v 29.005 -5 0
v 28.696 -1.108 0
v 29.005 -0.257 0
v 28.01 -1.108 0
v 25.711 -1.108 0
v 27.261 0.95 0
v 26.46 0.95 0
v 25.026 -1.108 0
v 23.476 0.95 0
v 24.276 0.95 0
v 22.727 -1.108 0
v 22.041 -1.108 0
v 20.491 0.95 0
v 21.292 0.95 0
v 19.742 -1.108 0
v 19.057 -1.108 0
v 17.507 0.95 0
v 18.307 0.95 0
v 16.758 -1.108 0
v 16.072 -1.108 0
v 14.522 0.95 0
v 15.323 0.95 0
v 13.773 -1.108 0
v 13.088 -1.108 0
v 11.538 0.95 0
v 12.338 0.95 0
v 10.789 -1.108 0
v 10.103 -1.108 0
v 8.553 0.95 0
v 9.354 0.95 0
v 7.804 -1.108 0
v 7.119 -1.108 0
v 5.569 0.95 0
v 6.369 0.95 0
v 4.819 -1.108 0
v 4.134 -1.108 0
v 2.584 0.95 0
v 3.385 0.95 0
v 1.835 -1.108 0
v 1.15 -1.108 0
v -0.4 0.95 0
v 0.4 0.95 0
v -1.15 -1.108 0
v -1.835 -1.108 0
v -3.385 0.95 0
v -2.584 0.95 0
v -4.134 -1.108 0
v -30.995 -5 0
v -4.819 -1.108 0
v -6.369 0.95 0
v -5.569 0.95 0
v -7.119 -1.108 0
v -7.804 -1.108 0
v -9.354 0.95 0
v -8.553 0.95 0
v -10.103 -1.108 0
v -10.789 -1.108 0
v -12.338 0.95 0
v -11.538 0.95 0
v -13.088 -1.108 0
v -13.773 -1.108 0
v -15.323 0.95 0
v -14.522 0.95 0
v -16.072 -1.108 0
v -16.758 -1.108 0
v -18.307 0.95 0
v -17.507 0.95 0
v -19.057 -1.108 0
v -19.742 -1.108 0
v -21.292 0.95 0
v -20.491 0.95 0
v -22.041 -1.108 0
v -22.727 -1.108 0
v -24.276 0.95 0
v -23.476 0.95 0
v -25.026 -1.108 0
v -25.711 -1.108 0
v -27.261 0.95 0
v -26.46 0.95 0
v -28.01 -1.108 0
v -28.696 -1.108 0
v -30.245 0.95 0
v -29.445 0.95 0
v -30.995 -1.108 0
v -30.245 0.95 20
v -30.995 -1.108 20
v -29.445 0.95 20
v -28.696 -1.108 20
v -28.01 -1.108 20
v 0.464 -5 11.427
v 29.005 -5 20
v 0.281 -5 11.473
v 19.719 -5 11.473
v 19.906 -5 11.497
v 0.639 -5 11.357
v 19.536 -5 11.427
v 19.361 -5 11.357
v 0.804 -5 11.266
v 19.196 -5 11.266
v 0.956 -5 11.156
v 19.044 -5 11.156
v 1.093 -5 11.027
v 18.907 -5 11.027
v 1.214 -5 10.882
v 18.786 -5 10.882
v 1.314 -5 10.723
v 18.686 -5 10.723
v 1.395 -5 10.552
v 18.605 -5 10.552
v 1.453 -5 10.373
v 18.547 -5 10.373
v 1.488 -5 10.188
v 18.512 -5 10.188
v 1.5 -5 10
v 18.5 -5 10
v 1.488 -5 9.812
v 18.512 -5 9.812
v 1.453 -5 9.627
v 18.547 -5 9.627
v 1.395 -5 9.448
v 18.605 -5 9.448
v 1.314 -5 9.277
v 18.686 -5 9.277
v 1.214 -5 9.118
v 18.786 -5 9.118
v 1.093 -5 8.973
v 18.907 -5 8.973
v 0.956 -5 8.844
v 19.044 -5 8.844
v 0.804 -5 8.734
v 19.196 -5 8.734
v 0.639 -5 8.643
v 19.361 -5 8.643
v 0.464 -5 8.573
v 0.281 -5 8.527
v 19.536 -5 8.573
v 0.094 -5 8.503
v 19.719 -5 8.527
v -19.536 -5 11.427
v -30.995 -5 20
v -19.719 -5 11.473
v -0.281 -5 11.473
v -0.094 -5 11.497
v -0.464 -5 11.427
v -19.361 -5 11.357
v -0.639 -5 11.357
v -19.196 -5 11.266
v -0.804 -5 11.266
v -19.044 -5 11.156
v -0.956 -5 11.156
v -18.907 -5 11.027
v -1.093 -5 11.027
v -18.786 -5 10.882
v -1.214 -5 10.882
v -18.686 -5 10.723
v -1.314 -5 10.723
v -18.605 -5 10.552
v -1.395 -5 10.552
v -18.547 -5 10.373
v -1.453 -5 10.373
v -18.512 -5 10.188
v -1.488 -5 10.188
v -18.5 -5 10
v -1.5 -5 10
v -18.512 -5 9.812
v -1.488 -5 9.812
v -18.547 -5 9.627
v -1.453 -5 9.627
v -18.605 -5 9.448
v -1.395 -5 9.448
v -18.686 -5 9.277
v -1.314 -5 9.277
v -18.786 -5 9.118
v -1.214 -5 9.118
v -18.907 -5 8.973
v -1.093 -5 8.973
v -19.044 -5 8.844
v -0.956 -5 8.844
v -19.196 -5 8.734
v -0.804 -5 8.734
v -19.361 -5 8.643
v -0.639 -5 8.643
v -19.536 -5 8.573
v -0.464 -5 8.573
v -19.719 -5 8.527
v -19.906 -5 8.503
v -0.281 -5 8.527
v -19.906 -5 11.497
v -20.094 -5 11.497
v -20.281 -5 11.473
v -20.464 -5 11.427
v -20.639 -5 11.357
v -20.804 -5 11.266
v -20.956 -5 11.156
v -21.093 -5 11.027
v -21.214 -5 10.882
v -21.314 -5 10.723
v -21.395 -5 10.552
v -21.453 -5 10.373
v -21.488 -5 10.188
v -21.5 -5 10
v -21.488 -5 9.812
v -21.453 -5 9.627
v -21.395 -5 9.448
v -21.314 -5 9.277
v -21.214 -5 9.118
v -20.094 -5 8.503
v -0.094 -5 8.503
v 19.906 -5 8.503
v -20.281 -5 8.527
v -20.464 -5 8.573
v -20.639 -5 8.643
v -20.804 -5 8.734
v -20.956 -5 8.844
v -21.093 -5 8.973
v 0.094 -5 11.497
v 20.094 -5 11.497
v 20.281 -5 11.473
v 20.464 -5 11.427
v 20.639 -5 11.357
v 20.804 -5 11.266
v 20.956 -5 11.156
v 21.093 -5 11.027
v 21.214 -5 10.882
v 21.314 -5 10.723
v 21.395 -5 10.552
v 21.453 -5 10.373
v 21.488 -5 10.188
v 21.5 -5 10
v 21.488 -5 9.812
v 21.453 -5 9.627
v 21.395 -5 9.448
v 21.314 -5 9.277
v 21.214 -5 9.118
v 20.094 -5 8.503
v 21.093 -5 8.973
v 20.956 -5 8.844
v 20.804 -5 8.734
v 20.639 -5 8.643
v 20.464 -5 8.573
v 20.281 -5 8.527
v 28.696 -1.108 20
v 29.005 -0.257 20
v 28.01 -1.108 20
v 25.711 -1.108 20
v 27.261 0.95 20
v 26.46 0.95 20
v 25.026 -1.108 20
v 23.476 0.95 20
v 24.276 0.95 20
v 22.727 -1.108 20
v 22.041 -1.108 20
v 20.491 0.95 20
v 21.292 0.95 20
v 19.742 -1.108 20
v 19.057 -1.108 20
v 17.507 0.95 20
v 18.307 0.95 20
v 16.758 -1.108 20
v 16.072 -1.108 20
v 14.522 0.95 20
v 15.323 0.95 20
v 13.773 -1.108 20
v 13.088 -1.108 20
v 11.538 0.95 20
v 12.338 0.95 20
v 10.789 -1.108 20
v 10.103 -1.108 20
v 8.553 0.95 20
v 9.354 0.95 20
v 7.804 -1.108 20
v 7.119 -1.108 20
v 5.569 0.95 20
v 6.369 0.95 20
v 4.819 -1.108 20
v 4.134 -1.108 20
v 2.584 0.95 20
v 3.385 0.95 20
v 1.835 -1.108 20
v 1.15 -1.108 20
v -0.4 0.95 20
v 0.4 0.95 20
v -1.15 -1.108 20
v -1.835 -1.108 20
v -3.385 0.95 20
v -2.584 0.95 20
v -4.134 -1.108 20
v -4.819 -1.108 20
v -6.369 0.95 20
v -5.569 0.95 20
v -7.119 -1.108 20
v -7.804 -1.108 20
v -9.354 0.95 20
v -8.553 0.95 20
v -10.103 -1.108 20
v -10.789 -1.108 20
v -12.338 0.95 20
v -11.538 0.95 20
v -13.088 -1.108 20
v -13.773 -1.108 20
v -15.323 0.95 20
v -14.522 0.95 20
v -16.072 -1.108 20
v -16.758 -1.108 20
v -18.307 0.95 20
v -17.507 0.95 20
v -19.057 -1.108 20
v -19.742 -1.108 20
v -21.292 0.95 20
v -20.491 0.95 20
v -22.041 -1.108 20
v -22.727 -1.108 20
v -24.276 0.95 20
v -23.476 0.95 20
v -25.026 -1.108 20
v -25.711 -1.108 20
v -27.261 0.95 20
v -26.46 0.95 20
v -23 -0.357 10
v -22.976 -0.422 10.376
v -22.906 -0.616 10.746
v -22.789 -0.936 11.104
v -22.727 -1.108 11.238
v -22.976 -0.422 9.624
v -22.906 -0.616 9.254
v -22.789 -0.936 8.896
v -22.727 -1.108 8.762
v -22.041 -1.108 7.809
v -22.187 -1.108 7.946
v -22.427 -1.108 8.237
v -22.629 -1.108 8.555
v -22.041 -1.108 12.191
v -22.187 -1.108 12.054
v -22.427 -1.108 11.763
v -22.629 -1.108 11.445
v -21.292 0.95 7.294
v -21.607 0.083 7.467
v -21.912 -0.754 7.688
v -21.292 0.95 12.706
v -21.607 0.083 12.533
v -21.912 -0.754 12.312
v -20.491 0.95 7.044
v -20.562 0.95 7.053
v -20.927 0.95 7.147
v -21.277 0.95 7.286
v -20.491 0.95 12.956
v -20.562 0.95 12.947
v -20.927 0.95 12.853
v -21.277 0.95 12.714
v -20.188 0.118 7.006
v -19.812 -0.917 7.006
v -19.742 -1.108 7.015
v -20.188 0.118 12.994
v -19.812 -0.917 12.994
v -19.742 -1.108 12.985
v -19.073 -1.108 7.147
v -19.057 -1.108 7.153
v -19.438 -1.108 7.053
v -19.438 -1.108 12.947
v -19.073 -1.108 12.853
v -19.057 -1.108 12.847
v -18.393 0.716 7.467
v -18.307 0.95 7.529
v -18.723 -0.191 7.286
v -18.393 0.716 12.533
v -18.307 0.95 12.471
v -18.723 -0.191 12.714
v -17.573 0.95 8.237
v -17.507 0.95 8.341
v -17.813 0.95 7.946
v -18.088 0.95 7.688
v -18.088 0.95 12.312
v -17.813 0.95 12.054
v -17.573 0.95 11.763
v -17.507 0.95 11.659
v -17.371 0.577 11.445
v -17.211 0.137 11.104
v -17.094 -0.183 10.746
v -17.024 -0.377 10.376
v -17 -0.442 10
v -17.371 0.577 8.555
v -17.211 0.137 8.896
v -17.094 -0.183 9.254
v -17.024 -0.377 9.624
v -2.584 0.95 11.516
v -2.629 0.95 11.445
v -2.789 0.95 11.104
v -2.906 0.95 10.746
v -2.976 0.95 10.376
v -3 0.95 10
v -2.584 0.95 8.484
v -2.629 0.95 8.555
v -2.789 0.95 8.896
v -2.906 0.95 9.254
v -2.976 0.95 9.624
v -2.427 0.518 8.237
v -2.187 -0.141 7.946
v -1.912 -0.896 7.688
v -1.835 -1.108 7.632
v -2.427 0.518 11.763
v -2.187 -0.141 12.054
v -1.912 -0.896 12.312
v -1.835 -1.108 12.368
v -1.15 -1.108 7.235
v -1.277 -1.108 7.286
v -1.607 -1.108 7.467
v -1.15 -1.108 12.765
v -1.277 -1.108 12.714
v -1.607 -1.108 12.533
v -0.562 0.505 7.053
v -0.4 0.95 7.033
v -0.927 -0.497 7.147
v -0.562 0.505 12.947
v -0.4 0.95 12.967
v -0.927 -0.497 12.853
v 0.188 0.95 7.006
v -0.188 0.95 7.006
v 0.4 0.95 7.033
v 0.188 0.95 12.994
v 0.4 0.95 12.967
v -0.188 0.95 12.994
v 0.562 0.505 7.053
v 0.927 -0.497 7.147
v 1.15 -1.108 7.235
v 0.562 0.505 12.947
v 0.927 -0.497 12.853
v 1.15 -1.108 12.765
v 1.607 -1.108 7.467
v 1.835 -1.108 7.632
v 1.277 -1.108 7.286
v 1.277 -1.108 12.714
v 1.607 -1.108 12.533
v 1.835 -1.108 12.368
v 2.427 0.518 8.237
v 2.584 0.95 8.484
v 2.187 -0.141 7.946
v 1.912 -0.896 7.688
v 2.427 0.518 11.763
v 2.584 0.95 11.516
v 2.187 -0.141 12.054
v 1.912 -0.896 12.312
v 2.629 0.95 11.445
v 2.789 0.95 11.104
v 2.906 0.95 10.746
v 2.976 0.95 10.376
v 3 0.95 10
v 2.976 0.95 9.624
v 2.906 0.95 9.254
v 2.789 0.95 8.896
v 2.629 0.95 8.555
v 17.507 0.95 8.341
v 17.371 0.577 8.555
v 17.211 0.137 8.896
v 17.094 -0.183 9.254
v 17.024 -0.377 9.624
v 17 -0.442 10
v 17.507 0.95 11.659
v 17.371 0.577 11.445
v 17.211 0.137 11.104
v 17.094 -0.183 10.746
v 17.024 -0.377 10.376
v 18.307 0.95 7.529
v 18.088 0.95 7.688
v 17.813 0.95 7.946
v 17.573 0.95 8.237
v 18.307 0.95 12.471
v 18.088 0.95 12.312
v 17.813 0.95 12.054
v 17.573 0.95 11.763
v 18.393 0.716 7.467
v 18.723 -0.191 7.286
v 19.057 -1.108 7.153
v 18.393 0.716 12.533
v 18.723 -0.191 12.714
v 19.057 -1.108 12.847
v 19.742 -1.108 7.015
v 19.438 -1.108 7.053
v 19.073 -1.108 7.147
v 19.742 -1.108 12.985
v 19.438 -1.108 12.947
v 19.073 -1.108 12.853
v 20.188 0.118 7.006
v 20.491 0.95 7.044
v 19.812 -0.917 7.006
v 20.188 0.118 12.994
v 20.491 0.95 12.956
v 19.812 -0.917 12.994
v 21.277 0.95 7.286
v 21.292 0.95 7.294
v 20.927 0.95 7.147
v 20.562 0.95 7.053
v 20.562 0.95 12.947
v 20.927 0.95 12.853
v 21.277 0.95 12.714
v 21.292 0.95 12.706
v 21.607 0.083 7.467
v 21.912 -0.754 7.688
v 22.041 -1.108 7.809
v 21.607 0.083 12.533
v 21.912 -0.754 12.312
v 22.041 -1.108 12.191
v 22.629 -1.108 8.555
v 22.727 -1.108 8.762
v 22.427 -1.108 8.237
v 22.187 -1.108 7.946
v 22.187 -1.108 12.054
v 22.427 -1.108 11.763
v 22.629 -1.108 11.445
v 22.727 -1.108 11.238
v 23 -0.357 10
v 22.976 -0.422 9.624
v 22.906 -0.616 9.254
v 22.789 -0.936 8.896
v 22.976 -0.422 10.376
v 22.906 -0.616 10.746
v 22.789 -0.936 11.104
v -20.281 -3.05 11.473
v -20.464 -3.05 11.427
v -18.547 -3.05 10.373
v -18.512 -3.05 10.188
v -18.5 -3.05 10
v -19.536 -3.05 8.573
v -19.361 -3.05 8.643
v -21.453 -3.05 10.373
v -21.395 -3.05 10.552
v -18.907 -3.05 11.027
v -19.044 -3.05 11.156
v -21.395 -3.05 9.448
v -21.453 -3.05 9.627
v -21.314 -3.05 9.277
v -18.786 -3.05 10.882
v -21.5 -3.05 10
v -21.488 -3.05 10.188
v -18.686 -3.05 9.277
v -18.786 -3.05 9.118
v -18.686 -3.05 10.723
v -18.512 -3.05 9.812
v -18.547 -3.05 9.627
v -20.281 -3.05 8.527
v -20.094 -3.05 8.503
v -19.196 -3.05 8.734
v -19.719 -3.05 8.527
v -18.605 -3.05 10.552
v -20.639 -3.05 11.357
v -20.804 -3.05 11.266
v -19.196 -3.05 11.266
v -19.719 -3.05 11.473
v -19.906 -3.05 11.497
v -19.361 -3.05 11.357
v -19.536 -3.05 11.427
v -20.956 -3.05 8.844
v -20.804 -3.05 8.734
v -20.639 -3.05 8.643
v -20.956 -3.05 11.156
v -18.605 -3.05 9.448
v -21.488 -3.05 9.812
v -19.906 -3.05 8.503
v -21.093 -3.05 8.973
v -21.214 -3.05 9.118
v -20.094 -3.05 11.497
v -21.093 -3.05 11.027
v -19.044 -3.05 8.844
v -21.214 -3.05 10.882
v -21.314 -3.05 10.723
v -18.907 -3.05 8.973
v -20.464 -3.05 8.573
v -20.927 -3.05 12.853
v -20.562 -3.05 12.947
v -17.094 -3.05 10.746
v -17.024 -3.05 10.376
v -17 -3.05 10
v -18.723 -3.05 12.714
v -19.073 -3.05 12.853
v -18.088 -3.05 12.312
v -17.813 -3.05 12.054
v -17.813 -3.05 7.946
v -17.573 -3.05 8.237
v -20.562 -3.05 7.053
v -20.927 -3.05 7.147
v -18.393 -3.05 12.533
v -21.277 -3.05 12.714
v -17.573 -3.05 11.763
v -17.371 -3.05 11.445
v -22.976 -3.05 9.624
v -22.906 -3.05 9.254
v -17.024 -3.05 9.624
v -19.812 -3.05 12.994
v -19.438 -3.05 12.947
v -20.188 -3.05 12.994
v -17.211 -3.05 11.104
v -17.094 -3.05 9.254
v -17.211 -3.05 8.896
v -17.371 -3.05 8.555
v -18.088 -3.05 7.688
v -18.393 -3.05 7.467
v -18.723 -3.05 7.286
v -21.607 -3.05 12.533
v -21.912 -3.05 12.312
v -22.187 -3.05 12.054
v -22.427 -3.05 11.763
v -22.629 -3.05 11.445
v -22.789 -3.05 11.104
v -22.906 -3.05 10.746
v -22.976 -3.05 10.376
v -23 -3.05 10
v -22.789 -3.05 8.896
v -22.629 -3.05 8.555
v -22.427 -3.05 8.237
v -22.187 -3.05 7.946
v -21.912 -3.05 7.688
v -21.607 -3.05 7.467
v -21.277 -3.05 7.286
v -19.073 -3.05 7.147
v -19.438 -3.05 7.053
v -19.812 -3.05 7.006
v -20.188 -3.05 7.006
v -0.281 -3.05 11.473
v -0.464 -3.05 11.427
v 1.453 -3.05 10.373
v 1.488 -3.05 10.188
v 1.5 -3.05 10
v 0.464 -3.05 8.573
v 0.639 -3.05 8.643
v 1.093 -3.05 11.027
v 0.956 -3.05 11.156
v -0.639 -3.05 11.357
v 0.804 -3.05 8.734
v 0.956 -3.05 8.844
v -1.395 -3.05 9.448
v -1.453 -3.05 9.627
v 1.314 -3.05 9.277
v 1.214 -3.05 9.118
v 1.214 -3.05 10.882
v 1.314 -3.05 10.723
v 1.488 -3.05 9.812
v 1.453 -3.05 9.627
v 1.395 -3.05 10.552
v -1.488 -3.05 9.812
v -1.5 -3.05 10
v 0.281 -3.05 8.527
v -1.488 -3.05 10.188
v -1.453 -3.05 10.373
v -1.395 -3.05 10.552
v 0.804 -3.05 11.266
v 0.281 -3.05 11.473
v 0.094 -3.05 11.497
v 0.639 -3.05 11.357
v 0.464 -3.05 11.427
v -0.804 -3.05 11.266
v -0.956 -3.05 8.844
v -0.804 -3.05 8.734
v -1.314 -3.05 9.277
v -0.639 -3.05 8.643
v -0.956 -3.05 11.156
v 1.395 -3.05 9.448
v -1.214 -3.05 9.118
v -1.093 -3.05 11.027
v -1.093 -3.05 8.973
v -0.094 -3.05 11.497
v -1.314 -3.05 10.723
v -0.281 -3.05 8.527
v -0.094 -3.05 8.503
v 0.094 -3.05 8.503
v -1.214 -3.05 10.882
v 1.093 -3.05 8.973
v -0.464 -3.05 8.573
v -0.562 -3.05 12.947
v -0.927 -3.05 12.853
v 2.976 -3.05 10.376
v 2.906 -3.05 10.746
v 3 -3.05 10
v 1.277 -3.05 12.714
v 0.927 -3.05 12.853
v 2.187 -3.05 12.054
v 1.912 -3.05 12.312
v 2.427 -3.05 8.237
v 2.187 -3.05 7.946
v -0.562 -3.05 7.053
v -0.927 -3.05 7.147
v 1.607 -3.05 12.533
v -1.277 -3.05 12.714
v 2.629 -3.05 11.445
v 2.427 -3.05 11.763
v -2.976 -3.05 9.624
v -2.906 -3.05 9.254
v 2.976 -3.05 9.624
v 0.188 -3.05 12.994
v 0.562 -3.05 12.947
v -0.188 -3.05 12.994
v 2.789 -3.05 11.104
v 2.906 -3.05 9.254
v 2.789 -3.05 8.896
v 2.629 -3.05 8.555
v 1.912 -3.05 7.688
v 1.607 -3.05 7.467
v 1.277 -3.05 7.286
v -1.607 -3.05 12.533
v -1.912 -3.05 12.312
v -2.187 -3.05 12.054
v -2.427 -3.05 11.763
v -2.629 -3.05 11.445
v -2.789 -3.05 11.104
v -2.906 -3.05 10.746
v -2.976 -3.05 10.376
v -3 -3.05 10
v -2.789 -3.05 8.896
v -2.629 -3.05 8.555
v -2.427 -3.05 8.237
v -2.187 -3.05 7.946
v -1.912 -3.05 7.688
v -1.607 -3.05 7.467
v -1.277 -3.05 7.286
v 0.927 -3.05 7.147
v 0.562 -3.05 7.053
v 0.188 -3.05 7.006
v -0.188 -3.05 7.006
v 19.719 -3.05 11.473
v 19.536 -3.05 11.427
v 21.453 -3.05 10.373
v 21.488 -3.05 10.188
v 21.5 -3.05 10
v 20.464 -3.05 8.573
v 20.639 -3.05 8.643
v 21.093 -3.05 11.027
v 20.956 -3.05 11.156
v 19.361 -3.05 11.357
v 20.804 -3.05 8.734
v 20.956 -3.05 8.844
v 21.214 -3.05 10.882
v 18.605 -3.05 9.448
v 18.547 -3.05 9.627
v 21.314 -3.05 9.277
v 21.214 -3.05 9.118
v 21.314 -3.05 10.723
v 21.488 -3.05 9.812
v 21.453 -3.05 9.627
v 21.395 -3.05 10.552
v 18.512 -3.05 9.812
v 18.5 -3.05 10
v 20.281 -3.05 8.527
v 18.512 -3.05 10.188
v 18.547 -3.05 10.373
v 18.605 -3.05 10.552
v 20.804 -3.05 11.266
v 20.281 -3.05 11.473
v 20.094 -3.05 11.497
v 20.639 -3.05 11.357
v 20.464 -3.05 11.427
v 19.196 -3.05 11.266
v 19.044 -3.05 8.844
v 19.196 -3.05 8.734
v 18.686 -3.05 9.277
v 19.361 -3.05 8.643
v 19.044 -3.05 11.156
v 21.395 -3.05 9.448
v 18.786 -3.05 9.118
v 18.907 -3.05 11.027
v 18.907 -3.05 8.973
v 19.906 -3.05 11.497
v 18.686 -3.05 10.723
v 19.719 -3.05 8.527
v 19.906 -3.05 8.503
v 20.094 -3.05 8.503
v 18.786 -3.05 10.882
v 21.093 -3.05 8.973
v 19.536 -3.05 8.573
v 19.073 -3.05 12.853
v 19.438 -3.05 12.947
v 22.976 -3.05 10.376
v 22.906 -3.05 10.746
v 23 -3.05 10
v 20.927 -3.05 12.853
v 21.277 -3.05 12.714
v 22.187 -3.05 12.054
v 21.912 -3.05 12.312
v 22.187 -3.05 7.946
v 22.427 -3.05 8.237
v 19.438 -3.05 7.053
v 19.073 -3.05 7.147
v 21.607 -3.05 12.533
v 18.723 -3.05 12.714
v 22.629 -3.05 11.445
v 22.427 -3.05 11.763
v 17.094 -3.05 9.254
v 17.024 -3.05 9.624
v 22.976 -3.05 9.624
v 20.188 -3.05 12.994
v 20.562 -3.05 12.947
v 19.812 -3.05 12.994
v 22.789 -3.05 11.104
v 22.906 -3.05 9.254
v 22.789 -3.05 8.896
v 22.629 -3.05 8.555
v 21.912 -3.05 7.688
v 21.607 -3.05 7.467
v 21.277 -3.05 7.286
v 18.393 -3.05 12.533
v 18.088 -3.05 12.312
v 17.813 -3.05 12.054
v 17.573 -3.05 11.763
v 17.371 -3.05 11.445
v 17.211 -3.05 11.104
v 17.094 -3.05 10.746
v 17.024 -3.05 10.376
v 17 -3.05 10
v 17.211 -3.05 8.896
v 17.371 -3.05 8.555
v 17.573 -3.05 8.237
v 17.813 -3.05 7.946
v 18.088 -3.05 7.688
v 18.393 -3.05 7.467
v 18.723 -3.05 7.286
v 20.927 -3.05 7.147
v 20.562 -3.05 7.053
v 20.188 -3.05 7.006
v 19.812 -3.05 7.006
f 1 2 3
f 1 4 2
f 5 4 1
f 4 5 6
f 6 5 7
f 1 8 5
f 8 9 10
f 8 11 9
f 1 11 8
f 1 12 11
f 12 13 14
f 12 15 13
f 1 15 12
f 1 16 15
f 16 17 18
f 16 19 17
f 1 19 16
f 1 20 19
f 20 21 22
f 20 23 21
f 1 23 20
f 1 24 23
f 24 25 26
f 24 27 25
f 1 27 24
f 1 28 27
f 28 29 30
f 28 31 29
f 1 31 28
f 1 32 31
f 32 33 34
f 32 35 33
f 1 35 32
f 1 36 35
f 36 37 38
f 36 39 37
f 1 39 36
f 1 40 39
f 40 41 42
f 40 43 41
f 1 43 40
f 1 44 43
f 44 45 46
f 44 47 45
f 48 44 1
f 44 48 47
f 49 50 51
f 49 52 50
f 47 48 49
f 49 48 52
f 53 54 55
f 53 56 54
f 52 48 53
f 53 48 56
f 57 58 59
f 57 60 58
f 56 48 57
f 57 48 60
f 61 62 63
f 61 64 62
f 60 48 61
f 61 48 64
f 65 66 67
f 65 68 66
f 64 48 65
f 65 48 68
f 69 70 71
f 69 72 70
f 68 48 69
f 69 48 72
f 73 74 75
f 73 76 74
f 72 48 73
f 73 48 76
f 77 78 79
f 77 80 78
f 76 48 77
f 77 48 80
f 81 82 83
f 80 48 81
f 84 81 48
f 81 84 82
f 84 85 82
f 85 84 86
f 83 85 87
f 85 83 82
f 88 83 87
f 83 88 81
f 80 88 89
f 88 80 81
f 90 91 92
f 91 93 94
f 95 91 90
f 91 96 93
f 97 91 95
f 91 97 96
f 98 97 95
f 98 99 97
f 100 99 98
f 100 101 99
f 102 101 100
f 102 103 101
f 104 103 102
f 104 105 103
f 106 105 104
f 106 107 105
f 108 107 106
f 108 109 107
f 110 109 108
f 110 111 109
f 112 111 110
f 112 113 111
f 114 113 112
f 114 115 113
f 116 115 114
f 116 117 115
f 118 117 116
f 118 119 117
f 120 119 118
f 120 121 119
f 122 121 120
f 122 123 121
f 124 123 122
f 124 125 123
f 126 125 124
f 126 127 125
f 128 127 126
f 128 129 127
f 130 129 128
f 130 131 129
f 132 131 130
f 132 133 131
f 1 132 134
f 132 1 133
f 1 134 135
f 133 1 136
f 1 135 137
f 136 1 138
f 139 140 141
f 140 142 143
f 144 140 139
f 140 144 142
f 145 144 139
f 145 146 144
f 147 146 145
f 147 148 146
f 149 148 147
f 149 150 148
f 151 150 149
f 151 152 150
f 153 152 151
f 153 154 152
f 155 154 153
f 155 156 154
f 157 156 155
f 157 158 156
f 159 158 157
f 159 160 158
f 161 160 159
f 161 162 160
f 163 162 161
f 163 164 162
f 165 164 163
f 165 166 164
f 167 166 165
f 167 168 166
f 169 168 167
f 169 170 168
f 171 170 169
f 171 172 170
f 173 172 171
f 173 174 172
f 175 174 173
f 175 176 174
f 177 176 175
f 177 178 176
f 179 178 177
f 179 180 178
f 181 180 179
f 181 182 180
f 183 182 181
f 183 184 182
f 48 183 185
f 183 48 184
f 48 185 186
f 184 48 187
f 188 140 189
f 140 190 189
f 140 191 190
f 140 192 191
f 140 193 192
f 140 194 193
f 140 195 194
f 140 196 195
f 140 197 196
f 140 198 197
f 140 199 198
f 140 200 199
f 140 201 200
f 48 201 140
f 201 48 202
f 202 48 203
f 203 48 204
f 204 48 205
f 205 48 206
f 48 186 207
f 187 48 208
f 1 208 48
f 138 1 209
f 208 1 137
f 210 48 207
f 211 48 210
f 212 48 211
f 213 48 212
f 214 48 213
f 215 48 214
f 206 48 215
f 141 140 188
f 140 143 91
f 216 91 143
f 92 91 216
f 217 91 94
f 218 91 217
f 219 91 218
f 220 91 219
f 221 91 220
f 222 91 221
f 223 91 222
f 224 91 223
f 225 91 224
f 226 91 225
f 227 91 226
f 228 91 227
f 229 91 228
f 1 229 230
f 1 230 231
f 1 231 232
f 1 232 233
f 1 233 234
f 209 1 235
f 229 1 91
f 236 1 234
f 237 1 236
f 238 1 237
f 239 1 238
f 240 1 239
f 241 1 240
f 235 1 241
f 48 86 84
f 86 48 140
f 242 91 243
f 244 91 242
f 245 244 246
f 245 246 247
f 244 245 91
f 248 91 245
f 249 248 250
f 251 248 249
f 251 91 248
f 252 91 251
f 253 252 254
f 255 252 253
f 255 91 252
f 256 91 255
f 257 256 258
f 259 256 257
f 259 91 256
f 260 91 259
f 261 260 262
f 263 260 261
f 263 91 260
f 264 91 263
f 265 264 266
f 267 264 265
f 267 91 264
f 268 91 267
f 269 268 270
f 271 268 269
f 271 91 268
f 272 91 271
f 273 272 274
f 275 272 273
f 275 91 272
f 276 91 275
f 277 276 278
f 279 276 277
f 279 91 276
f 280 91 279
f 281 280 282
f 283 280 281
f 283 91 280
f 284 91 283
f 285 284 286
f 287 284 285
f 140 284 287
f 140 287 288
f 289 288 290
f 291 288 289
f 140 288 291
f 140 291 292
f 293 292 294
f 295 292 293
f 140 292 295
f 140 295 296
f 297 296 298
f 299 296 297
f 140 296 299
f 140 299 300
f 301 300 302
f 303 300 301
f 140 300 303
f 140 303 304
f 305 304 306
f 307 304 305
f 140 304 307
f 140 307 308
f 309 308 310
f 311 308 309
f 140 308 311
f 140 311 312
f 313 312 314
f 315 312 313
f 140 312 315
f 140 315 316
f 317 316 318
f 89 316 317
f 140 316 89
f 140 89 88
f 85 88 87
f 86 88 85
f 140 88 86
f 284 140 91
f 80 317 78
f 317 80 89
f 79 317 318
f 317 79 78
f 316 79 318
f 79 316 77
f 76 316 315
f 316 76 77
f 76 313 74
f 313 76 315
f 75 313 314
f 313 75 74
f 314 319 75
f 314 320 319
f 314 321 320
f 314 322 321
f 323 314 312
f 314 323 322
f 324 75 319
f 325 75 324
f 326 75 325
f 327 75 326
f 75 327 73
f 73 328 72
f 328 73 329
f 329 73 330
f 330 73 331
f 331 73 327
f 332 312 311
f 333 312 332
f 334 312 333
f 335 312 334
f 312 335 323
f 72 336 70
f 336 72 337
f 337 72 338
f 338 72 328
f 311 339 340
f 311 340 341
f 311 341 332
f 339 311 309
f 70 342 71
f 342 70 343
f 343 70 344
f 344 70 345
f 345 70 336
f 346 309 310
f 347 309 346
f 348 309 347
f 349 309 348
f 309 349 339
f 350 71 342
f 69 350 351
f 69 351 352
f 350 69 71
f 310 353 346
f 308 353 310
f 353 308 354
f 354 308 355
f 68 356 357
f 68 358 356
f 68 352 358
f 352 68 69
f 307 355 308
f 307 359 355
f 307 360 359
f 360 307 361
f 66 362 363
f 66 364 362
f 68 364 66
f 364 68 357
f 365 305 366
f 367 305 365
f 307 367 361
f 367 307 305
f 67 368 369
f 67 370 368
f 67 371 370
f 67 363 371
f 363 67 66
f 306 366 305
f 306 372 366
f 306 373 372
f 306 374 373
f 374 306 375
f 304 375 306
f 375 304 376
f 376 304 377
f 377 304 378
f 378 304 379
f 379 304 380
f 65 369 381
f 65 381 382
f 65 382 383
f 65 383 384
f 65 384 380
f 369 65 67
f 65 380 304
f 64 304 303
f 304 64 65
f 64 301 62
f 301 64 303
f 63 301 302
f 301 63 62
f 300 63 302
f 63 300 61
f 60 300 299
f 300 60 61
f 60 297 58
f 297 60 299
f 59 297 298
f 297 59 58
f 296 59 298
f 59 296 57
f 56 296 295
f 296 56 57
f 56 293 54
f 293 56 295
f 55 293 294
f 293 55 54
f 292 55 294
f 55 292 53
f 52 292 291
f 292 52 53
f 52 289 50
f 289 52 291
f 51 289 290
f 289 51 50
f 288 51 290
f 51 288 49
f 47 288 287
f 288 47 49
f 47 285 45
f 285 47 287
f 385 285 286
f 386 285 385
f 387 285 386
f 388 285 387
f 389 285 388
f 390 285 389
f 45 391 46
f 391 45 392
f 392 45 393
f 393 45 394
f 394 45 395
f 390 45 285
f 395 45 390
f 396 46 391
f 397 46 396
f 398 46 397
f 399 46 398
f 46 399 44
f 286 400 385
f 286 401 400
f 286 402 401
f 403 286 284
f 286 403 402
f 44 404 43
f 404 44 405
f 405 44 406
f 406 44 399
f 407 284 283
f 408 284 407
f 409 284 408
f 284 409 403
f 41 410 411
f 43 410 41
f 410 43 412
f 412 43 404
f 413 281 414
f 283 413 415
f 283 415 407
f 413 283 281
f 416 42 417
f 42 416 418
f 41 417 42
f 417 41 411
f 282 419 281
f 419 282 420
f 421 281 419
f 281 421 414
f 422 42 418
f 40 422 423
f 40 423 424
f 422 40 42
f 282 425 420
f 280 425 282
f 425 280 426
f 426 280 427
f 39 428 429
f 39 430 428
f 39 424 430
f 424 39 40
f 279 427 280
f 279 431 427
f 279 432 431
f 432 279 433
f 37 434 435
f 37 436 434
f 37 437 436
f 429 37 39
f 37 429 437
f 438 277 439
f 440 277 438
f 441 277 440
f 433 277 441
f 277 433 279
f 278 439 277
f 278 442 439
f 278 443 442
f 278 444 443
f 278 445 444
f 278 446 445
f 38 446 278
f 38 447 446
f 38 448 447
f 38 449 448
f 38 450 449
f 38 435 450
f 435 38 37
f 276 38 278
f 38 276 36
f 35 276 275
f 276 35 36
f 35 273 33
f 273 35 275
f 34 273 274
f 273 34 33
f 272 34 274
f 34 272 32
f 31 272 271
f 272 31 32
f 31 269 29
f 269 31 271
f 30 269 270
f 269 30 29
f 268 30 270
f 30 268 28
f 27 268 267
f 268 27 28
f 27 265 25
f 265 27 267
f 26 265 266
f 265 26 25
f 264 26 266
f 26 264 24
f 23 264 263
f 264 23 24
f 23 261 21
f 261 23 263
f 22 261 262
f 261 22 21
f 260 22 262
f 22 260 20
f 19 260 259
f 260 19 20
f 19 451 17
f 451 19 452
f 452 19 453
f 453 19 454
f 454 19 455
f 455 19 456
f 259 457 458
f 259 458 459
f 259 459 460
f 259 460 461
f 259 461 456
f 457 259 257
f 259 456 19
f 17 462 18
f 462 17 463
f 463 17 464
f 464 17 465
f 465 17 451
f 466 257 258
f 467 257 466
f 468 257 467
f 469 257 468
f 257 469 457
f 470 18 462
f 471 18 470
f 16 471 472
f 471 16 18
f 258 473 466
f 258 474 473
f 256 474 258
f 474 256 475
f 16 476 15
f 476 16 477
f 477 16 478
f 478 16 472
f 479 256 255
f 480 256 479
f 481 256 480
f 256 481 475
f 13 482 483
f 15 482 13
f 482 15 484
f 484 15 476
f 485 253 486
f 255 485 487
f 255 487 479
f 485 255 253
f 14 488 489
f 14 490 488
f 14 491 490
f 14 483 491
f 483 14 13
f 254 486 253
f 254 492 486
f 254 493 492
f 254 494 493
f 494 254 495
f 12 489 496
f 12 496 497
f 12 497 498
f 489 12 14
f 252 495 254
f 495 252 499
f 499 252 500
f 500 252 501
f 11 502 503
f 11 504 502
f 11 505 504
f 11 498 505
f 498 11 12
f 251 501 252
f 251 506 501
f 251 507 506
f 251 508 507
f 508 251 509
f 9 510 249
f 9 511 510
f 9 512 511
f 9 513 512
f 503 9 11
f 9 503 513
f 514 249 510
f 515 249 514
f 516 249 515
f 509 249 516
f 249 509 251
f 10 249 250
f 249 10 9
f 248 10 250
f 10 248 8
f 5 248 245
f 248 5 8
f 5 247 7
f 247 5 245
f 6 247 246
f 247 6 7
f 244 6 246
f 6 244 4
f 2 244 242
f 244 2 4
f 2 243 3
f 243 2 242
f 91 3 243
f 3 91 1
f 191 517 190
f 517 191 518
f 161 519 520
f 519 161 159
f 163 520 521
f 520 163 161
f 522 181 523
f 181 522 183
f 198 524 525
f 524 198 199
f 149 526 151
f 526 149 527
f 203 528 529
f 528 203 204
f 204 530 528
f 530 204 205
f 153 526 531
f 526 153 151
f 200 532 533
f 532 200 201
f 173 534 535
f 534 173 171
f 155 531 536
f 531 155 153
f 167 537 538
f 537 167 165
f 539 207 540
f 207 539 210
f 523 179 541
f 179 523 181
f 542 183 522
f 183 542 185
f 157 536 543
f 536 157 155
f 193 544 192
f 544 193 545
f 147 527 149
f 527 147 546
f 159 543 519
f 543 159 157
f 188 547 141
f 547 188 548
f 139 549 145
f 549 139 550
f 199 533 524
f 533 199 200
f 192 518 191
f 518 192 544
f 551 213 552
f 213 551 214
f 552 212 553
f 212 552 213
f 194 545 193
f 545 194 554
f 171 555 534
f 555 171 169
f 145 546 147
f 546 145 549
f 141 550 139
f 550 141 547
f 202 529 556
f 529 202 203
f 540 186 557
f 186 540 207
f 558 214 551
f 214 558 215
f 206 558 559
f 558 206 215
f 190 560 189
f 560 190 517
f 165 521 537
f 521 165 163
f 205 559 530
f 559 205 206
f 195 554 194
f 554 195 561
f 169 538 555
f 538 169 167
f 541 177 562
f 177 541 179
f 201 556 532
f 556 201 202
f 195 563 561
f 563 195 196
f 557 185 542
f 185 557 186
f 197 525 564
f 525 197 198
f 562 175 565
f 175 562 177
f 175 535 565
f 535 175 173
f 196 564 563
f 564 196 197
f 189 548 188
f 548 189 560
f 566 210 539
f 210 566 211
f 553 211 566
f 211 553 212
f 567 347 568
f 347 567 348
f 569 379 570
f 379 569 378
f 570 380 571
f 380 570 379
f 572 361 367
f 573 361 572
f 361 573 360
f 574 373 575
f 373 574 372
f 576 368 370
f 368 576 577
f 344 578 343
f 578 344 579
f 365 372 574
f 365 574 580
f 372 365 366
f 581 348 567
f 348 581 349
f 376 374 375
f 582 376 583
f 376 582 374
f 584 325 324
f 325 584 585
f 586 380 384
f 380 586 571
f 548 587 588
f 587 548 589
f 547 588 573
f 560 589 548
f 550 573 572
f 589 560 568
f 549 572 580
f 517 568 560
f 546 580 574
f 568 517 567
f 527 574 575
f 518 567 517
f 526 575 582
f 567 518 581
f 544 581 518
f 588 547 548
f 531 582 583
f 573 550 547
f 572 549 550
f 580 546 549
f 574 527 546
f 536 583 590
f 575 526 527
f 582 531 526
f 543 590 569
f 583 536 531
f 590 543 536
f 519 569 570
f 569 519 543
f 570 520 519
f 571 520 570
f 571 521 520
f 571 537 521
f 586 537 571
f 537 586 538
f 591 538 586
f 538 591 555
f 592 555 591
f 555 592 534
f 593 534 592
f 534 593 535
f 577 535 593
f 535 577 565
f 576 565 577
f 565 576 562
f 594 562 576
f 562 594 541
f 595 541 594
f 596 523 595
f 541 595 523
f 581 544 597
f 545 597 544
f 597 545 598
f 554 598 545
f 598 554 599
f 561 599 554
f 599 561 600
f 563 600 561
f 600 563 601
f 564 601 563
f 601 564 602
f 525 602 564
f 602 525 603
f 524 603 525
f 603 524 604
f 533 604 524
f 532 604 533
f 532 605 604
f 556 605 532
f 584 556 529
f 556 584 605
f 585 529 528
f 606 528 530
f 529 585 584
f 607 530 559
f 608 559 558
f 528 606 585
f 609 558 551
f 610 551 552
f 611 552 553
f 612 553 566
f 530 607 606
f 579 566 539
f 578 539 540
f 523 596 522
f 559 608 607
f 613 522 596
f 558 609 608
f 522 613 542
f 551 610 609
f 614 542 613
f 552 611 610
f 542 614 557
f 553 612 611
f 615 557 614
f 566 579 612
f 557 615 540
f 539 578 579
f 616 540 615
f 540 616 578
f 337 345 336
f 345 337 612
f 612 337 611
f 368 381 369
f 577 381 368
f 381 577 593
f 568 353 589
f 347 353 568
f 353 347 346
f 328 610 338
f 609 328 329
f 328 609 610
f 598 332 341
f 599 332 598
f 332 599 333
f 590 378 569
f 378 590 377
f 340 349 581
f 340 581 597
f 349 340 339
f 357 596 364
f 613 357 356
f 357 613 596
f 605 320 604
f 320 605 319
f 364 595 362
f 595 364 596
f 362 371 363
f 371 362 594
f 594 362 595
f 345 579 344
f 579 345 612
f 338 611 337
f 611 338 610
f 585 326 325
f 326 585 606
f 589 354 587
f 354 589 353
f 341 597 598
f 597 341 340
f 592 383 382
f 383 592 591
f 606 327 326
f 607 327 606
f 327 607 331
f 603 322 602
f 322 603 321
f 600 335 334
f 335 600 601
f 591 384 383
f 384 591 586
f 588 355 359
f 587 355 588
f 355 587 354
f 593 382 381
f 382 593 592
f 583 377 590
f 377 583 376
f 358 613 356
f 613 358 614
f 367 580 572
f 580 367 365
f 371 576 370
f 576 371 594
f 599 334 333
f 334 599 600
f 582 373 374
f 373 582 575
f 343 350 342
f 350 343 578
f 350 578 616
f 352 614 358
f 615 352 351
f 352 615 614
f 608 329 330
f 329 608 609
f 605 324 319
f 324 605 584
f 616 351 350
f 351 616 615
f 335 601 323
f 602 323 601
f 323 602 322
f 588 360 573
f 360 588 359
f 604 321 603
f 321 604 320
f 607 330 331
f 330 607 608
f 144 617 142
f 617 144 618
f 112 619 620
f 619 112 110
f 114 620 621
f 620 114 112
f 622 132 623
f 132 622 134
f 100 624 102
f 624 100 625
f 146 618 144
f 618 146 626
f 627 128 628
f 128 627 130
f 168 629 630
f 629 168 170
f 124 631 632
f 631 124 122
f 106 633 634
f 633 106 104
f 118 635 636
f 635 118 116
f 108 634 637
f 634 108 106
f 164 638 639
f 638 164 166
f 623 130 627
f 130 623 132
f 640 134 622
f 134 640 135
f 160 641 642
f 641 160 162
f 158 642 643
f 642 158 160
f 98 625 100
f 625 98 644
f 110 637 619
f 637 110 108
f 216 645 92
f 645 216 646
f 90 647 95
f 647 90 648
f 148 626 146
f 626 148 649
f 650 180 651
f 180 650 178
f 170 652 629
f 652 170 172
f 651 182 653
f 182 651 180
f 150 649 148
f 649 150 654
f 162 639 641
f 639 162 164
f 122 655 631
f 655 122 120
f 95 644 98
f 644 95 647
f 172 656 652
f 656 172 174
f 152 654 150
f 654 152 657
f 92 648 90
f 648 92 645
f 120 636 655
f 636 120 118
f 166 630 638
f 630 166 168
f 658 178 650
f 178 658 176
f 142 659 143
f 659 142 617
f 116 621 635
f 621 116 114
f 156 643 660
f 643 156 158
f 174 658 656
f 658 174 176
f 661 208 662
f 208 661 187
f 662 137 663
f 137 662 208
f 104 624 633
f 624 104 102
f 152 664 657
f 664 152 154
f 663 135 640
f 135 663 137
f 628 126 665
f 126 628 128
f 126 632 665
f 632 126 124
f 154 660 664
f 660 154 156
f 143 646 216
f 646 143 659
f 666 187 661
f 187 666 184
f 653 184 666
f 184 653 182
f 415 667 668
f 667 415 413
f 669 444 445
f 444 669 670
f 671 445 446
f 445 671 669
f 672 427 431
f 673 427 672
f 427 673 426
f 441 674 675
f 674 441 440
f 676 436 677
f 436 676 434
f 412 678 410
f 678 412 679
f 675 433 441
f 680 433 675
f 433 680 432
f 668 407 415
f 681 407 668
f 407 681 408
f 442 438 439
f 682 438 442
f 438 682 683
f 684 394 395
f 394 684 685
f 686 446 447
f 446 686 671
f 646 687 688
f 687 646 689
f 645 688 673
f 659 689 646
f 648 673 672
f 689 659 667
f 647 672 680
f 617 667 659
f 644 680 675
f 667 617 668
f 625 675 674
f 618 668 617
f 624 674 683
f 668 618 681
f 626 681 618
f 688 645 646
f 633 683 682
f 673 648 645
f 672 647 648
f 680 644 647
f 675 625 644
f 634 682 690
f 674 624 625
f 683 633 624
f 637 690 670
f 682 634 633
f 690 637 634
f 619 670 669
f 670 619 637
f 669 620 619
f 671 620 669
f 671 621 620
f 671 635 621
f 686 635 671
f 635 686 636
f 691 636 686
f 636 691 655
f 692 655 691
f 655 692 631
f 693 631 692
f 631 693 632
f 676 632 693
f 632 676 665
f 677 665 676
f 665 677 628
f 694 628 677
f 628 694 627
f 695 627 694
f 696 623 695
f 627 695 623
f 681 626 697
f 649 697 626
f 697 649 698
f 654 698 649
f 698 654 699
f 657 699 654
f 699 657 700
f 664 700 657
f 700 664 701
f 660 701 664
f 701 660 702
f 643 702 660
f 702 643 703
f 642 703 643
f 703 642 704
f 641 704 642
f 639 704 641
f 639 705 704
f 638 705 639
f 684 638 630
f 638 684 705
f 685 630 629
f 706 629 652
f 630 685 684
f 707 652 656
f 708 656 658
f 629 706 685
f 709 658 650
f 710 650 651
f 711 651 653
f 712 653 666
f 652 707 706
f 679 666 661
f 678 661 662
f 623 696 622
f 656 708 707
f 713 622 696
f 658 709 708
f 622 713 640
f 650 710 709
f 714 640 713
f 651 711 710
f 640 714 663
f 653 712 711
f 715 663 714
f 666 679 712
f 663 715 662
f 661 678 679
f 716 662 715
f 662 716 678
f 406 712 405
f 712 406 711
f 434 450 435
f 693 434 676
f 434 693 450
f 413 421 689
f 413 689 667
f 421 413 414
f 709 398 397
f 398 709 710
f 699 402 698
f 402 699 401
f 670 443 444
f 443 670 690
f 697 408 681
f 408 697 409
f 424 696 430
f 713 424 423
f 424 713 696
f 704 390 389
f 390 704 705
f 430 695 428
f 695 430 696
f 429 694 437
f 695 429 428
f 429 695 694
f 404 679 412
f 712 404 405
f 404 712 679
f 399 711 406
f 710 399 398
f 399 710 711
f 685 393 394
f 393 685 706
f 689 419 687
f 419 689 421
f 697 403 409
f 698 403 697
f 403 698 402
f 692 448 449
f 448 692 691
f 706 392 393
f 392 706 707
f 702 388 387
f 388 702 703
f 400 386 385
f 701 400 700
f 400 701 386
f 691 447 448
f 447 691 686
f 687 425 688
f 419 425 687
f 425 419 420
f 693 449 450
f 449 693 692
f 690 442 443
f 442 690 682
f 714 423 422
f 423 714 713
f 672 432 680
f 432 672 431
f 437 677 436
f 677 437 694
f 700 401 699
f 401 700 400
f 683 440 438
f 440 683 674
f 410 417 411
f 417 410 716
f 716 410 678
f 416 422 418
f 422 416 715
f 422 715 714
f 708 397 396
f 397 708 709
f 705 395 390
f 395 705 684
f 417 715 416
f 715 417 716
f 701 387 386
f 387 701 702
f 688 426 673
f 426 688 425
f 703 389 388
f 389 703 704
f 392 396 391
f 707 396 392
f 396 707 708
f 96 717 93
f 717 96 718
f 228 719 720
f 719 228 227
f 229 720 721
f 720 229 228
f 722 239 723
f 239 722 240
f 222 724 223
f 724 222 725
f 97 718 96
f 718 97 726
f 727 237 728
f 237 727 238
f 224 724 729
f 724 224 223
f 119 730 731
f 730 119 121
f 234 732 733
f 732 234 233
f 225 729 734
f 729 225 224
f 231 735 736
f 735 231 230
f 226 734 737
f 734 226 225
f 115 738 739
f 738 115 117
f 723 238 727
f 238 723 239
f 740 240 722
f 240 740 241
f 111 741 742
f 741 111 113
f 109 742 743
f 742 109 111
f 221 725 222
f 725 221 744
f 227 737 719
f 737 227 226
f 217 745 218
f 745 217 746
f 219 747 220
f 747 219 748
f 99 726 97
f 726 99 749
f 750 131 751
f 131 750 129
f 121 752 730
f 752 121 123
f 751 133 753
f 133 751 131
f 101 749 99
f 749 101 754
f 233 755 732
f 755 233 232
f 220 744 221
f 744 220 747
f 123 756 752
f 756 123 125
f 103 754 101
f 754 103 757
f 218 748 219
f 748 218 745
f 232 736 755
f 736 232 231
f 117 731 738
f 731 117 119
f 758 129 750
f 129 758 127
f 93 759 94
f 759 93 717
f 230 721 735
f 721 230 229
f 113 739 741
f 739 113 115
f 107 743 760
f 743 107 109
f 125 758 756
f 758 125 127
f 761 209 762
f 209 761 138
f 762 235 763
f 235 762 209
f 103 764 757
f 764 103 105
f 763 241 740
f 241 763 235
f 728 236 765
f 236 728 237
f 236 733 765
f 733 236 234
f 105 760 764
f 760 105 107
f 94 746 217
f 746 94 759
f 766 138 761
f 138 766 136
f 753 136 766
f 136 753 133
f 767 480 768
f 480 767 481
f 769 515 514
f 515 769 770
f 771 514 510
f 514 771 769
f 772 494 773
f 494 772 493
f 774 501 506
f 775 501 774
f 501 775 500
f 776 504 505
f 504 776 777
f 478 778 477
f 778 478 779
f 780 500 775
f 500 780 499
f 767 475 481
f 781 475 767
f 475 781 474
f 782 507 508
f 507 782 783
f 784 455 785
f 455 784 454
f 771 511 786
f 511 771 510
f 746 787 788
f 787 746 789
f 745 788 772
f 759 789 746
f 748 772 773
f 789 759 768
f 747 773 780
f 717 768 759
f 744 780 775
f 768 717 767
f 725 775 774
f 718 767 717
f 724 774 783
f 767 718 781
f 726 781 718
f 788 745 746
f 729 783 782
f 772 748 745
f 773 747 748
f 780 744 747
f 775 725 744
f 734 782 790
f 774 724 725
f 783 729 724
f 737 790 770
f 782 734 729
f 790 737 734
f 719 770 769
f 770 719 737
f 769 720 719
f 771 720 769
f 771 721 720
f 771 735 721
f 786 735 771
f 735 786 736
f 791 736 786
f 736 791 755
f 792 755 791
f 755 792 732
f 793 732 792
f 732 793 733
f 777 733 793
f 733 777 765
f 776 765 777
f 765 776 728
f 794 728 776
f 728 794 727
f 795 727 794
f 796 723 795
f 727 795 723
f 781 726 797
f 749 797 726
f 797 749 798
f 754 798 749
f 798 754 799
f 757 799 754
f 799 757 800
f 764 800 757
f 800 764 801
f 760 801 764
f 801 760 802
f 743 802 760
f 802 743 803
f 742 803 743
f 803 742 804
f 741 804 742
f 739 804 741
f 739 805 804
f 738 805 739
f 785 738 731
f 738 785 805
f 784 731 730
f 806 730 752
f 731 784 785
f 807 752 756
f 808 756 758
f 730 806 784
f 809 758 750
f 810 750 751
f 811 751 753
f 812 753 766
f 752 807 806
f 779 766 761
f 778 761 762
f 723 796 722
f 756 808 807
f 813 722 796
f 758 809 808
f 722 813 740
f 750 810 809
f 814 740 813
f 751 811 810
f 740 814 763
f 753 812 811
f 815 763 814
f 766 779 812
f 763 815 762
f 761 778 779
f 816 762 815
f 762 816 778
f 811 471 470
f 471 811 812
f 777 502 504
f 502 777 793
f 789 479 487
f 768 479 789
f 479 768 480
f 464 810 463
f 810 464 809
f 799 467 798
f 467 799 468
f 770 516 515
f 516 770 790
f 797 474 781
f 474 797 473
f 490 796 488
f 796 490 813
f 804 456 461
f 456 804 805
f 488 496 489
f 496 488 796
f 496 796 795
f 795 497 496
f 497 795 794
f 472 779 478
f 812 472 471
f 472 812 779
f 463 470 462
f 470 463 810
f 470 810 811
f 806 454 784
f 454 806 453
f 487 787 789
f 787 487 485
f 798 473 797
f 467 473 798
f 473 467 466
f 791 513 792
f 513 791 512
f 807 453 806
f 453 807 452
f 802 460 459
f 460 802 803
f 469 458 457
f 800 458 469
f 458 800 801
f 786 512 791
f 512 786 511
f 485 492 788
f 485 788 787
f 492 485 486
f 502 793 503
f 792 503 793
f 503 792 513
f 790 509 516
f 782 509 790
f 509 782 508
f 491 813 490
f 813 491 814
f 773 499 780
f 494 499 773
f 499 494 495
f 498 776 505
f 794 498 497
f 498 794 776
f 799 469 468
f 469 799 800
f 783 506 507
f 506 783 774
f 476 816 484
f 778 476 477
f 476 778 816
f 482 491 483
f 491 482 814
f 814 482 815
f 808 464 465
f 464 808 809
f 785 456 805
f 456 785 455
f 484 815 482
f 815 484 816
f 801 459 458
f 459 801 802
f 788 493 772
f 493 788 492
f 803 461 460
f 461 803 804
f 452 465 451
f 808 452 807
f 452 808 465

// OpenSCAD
include <../gears.scad>

mountable_rack(modul=1, length=60, height=5, width=20, pressure_angle=20, helix_angle=0, profile=3, head="PH", fastners=3);
